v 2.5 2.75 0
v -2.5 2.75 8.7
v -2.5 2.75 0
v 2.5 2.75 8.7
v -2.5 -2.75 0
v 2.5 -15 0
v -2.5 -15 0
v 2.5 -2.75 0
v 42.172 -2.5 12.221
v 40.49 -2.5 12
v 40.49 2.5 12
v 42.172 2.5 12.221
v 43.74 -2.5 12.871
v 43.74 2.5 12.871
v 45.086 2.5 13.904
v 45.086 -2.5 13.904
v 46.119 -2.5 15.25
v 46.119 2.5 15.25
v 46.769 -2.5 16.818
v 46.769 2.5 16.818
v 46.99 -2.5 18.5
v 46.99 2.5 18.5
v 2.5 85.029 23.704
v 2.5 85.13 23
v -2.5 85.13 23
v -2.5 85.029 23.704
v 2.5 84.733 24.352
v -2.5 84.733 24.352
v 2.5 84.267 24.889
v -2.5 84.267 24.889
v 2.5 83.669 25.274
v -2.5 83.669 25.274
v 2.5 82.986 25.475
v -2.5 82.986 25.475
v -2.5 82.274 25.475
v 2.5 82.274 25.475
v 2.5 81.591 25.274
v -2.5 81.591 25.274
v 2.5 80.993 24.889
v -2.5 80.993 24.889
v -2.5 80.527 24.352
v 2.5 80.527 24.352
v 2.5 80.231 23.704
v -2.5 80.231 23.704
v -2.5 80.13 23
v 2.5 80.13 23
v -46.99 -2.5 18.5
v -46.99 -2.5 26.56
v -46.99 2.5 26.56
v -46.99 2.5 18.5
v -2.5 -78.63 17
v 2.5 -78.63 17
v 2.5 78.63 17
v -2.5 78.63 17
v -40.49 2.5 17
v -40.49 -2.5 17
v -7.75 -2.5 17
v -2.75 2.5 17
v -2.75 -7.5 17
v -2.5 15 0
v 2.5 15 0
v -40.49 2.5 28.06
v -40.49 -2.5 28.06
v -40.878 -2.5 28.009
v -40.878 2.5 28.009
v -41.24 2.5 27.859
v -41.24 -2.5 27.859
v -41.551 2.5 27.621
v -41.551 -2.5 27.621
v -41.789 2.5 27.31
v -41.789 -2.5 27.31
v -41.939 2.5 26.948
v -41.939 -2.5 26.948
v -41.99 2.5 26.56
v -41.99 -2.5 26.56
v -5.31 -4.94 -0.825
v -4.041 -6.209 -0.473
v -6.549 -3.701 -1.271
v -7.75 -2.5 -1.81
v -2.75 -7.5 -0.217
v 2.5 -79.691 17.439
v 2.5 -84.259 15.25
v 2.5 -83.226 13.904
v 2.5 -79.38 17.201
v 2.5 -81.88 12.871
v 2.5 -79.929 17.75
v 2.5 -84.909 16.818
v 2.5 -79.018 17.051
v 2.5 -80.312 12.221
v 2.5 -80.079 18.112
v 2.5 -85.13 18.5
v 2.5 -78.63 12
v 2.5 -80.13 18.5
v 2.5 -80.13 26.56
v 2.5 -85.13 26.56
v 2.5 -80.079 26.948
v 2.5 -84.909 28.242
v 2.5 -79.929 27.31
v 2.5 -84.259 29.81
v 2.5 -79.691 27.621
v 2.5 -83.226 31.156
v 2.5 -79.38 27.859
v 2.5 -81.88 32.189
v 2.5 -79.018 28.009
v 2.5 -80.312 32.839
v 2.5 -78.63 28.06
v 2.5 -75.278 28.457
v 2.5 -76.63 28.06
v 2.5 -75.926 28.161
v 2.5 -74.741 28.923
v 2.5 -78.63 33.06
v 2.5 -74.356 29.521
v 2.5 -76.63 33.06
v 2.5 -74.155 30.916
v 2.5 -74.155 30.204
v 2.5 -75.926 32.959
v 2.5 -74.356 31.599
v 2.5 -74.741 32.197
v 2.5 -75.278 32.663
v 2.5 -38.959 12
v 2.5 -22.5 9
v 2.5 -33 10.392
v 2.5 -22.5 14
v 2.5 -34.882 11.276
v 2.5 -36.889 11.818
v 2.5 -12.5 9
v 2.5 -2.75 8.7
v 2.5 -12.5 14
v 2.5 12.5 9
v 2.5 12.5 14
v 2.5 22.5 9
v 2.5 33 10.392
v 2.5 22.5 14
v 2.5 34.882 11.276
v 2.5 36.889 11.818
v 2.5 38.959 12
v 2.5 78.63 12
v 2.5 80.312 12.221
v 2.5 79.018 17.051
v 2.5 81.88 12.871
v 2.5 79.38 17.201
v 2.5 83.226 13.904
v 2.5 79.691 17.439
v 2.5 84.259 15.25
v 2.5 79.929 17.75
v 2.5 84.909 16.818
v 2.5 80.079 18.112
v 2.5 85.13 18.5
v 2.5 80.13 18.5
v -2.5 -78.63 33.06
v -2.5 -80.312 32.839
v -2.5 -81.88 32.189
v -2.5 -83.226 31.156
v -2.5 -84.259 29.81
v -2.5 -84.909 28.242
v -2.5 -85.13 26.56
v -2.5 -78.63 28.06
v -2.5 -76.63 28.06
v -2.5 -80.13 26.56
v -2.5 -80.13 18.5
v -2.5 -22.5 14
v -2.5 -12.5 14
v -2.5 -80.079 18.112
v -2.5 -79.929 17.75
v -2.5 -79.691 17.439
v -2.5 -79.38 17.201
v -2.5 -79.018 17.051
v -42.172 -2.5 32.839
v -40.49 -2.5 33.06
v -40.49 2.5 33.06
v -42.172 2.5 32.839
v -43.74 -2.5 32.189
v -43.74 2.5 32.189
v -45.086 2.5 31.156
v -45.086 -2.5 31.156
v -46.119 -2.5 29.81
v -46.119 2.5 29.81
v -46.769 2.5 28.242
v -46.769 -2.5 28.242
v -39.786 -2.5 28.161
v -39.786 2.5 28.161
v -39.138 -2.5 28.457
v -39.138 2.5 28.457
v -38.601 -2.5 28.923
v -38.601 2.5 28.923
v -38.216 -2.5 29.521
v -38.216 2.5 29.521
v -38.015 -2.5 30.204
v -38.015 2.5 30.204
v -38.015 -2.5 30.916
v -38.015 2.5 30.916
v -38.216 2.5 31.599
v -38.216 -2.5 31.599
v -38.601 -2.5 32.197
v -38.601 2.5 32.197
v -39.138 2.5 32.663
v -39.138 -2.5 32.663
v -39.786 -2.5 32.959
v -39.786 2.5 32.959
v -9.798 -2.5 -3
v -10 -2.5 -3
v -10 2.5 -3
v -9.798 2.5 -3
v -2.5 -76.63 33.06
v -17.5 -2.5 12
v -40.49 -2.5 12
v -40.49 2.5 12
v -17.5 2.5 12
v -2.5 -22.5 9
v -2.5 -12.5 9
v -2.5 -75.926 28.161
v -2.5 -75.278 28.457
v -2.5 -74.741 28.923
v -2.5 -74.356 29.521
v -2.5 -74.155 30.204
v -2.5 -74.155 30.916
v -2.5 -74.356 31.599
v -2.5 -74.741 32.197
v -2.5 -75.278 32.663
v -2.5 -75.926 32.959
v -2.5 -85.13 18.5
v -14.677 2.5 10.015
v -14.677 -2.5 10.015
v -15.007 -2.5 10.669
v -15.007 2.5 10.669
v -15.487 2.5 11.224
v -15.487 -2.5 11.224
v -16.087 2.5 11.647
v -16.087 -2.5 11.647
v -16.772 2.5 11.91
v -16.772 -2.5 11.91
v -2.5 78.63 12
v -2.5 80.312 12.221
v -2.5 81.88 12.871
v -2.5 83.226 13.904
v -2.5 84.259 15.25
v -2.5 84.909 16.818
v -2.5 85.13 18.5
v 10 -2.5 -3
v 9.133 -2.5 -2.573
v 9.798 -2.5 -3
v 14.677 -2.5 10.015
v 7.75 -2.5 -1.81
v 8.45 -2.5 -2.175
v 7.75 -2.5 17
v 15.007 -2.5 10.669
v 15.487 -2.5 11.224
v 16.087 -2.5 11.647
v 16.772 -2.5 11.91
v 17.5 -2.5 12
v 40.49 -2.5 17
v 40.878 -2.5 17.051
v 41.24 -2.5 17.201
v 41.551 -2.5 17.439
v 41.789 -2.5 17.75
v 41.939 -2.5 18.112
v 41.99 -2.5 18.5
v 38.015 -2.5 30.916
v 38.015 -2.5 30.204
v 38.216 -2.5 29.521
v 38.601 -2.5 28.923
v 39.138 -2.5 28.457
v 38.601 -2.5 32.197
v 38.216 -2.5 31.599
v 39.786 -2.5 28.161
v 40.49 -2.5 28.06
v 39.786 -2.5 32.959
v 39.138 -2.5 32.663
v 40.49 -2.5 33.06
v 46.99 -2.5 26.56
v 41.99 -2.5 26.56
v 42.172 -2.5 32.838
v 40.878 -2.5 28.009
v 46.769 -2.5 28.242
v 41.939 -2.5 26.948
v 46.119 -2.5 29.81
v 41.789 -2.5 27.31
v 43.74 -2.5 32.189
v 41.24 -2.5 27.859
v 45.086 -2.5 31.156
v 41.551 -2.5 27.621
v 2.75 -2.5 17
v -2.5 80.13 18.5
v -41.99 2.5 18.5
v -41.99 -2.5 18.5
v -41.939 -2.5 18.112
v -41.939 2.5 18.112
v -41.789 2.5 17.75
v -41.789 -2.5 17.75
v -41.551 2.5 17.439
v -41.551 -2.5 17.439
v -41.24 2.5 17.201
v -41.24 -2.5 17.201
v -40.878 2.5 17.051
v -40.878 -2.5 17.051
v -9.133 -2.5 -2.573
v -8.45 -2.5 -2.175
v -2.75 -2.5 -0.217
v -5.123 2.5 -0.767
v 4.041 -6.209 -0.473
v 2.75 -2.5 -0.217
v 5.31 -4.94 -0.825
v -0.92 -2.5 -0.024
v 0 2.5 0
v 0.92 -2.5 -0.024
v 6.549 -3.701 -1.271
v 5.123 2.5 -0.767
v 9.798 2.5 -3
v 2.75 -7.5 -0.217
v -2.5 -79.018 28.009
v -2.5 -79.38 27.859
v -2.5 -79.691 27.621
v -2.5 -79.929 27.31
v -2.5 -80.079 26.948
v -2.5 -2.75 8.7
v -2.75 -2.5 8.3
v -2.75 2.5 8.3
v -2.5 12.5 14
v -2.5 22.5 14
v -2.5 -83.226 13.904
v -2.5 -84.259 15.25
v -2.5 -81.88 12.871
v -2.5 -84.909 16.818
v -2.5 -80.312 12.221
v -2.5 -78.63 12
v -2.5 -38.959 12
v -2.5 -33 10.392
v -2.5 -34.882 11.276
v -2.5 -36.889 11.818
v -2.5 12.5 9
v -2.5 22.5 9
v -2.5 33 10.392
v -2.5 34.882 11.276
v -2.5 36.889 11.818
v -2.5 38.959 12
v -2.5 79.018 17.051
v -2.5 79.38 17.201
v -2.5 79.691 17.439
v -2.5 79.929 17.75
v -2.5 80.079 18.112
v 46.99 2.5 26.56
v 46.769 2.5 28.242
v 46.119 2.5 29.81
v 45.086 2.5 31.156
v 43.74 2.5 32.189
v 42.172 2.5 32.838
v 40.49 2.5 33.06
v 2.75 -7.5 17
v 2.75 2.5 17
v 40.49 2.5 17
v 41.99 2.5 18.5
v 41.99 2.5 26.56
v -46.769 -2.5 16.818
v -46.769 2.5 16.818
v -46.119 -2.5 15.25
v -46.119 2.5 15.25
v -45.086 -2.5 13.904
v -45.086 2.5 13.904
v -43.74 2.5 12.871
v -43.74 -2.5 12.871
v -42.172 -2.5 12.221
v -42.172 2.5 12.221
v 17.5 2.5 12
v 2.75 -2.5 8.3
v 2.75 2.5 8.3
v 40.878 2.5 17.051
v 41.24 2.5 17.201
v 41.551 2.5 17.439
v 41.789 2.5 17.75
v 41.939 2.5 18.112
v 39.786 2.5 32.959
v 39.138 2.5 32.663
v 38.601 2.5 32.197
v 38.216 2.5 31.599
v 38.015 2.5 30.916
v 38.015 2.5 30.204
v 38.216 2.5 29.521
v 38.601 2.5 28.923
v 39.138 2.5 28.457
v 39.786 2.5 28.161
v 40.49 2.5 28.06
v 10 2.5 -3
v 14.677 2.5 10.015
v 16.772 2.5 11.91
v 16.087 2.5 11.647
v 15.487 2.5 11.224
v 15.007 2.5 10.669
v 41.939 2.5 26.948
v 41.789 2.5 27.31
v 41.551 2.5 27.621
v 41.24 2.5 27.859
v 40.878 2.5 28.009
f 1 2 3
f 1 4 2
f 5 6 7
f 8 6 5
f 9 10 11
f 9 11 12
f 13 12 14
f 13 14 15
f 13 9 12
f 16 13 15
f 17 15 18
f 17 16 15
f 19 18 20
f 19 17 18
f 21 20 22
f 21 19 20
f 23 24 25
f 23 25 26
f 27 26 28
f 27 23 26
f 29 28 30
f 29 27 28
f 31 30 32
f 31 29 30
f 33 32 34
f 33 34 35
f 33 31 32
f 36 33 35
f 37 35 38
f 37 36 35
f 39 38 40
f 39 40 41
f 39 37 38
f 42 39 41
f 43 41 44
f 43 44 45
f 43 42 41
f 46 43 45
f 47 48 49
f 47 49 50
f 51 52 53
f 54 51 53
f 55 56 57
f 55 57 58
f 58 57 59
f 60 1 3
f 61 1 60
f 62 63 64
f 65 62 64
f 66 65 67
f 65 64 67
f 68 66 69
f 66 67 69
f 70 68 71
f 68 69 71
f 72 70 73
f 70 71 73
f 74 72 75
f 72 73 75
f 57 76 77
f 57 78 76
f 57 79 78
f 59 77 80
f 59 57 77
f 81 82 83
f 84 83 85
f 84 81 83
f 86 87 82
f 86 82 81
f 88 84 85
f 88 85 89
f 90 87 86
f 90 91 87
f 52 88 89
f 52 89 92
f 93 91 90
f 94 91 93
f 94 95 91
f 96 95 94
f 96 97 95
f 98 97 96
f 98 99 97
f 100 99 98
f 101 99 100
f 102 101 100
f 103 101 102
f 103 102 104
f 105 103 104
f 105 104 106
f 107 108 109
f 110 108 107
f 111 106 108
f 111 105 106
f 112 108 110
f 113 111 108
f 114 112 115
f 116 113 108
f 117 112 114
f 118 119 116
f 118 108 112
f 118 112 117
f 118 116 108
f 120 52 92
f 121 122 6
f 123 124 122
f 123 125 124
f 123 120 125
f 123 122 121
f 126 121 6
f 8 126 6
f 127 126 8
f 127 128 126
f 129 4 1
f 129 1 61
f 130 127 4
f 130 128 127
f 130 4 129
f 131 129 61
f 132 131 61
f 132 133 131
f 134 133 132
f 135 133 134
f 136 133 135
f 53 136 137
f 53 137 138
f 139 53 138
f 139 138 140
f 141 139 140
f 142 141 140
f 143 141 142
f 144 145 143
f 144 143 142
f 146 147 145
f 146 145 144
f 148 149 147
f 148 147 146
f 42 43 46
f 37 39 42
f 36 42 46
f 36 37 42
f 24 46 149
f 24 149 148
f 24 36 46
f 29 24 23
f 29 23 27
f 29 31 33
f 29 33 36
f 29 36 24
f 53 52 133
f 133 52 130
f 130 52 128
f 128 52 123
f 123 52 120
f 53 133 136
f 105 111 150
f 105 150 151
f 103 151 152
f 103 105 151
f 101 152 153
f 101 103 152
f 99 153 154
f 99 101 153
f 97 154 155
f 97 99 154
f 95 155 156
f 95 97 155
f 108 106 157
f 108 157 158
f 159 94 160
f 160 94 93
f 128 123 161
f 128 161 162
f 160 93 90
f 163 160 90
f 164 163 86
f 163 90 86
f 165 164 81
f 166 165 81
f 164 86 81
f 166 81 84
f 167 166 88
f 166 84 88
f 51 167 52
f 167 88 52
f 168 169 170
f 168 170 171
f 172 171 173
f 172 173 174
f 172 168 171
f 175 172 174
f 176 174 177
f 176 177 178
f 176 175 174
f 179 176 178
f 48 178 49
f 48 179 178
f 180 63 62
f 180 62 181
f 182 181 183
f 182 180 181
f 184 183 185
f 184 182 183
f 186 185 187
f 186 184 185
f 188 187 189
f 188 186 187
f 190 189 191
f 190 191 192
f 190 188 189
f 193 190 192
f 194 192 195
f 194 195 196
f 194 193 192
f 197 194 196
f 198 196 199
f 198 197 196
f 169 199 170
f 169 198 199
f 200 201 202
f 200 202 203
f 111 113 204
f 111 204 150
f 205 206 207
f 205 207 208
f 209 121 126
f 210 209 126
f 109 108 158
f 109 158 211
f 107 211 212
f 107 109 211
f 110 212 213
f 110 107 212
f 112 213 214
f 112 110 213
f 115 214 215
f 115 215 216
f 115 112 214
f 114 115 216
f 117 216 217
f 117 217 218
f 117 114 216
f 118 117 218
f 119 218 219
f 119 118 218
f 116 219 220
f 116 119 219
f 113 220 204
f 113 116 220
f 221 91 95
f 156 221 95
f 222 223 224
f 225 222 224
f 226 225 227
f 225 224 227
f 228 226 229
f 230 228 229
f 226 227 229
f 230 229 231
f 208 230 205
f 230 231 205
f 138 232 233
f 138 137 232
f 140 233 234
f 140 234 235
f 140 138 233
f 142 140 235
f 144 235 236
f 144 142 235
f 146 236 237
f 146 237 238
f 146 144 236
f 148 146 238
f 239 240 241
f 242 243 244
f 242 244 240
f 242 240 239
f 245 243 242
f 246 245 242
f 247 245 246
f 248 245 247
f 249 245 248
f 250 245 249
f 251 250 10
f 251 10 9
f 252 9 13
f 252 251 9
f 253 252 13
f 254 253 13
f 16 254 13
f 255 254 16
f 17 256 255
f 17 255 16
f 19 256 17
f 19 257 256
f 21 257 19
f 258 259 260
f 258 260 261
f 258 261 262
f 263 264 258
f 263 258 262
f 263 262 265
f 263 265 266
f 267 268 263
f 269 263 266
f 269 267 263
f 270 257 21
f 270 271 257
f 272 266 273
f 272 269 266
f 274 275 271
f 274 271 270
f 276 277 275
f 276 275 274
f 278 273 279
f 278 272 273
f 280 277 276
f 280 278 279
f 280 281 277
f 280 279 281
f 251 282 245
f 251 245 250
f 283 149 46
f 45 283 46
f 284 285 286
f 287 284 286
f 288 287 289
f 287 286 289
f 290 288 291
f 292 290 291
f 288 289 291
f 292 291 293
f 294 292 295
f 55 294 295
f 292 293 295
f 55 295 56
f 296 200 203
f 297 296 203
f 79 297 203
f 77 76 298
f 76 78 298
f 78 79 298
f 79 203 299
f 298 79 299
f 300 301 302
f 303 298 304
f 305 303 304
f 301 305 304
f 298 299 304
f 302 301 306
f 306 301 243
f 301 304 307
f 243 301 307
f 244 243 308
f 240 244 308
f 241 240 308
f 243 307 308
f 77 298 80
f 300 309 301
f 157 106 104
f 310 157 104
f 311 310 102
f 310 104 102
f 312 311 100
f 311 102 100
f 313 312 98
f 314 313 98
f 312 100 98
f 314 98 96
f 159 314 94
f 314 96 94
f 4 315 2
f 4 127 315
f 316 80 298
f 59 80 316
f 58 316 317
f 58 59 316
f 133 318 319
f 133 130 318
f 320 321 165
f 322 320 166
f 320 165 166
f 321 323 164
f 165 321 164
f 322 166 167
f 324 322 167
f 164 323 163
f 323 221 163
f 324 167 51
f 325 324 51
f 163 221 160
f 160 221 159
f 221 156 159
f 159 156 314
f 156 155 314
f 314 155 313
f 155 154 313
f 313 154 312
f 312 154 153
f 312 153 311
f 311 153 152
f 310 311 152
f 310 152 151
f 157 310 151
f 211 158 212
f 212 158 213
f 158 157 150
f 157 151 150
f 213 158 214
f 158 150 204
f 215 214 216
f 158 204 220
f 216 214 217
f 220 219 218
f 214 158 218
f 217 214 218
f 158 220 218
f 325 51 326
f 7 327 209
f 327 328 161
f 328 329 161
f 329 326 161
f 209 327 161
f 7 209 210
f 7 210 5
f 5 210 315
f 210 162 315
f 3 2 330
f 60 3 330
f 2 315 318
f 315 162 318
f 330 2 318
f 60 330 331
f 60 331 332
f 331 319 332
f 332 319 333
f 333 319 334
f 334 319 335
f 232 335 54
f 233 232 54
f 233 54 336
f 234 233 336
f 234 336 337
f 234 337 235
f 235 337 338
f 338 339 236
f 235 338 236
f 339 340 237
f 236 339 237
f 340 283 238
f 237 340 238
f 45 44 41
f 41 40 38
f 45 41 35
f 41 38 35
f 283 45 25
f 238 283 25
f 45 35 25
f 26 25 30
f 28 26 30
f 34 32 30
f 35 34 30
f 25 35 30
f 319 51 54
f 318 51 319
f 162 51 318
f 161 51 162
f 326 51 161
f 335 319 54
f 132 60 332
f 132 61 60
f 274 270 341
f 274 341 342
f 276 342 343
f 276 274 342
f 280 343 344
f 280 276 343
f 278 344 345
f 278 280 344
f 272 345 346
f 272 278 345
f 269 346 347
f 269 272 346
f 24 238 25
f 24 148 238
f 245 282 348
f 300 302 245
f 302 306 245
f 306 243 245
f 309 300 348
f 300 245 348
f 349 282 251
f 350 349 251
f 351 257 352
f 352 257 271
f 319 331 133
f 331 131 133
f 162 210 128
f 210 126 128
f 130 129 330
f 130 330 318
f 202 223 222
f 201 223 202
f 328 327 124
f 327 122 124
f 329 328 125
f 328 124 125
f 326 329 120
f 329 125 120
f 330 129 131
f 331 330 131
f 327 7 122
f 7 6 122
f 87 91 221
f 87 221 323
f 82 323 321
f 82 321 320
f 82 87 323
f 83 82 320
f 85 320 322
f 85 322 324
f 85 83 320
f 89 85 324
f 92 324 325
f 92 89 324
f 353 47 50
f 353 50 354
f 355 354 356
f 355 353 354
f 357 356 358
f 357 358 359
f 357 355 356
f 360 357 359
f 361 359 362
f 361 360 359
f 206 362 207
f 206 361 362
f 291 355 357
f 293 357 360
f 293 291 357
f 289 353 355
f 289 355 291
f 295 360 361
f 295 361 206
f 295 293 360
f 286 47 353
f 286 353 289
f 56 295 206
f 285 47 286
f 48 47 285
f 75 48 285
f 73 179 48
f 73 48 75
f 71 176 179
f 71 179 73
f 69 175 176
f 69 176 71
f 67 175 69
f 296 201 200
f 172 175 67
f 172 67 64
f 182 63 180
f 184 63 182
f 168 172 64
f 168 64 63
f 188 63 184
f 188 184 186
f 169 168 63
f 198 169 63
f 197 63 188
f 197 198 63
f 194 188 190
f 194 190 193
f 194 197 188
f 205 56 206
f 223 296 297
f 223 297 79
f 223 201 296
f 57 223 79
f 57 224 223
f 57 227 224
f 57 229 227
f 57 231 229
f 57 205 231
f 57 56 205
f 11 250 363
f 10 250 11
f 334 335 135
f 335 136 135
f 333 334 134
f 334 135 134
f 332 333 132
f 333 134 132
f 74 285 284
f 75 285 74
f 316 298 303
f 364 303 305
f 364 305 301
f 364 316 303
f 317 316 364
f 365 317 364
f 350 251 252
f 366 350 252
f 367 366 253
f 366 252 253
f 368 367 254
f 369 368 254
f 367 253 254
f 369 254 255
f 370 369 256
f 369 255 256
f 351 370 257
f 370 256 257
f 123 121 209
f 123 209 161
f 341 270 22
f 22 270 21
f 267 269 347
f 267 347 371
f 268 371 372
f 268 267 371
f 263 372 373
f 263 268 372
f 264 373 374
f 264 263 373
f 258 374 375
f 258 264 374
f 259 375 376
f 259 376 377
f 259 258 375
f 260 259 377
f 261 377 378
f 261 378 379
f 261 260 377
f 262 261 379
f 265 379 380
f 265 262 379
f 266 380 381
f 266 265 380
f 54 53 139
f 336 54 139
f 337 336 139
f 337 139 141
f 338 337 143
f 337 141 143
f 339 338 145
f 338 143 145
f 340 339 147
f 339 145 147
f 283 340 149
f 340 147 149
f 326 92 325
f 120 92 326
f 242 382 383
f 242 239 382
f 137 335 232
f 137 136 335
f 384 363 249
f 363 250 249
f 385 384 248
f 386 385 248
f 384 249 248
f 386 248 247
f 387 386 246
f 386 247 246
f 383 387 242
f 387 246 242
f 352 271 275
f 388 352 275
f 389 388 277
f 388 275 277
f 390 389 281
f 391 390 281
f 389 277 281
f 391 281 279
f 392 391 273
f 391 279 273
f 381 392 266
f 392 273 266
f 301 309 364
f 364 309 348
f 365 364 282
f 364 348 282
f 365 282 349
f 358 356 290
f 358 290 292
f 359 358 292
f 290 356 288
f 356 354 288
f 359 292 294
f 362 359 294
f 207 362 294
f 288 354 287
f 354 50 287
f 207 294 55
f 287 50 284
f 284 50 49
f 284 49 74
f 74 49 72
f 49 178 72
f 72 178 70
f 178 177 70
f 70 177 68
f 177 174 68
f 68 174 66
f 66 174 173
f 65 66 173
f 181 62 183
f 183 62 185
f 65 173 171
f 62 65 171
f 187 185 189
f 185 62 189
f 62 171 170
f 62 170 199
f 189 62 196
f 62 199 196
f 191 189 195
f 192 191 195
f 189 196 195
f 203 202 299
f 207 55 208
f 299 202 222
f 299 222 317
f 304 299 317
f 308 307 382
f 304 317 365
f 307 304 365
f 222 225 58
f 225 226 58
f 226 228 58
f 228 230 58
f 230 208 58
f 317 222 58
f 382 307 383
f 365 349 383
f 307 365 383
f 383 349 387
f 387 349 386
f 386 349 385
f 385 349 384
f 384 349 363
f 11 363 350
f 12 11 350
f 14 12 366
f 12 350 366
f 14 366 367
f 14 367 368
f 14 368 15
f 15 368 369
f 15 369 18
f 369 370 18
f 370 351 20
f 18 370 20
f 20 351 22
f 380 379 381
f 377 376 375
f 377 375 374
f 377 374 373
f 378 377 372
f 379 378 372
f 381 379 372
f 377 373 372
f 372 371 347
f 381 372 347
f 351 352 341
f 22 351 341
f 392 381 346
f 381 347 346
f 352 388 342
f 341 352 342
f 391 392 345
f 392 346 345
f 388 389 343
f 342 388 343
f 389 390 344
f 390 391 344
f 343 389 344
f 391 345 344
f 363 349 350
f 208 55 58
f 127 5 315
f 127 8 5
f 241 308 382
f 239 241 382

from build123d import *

# Parameters (mm, degrees)
SKETCH_W     = 10
SKETCH_H     = 5
PAD_DEPTH    = 2.5
PAD001_DEPTH = 2.5
PAD002_DEPTH = 20
POCKET_DEPTH = 10


with BuildPart() as vertical:
    # Sketch → Pad (new body, symmetric)
    with BuildSketch(Plane.YZ):
        with BuildLine():
            Line((85.13, 18.499999), (85.13, 23.000005))
            ThreePointArc((85.13, 23.000005), (82.629997, 25.500005), (80.13, 23))
            Line((80.13, 18.500007), (80.13, 23))
            ThreePointArc((78.630003, 17), (79.690664, 17.439343), (80.13, 18.500007))
            Line((-78.630002, 17), (78.630003, 17))
            ThreePointArc((-80.13, 18.500007), (-79.690663, 17.439343), (-78.630002, 17))
            Line((-80.13, 26.559992), (-80.13, 18.500007))
            ThreePointArc((-78.630002, 28.06), (-79.690664, 27.620657), (-80.13, 26.559992))
            Line((-78.630002, 28.06), (-76.630002, 28.06))
            ThreePointArc((-76.630002, 28.06), (-74.130001, 30.56), (-76.630001, 33.06))
            Line((-76.630001, 33.06), (-78.63, 33.06))
            ThreePointArc((-78.63, 33.06), (-83.226194, 31.156194), (-85.13, 26.56))
            Line((-85.13, 18.500007), (-85.13, 26.56))
            ThreePointArc((-85.13, 18.500007), (-83.226197, 13.903808), (-78.63, 12))
            Line((-78.63, 12), (-38.959283, 12))
            ThreePointArc((-33, 10.392302), (-35.873115, 11.591017), (-38.959283, 12))
            Line((-15, 0), (-33, 10.392302))
            Line((-15, 0), (-2.75, 0))
            Line((-2.75, 0), (-2.75, 8.7))
            Line((-2.75, 8.7), (2.75, 8.7))
            Line((2.75, 8.7), (2.75, 0))
            Line((2.75, 0), (15, 0))
            Line((15, 0), (33, 10.392302))
            ThreePointArc((38.959283, 12), (35.873115, 11.591017), (33, 10.392302))
            Line((38.959283, 12), (78.63, 12))
            ThreePointArc((78.63, 12), (83.226194, 13.903806), (85.13, 18.499999))
        make_face()
        with Locations((-17.5, 11.5)):
            Rectangle(SKETCH_W, SKETCH_H, mode=Mode.SUBTRACT)
        with Locations((17.5, 11.5)):
            Rectangle(SKETCH_W, SKETCH_H, mode=Mode.SUBTRACT)
    extrude(amount=PAD_DEPTH, both=True)


with BuildPart() as fusion:
    # Sketch001 → Pad001 (new body, symmetric)
    with BuildSketch(Plane.XZ):
        with BuildLine():
            Line((17.5, 11.999987), (40.490006, 12))
            ThreePointArc((40.490006, 12), (45.086195, 13.903807), (46.99, 18.499998))
            Line((46.99, 26.559977), (46.99, 18.499998))
            ThreePointArc((46.99, 26.559977), (45.086194, 31.156169), (40.490002, 33.059975))
            ThreePointArc((40.490002, 33.059975), (37.990002, 30.559975), (40.490002, 28.059975))
            ThreePointArc((41.99, 26.559977), (41.55066, 27.620635), (40.490002, 28.059975))
            Line((41.99, 18.499998), (41.99, 26.559977))
            ThreePointArc((40.490002, 17), (41.55066, 17.43934), (41.99, 18.499998))
            Line((2.75, 17), (40.490002, 17))
            Line((2.75, 8.3), (2.75, 17))
            Line((-2.75, 8.3), (2.75, 8.3))
            Line((-2.75, 16.999987), (-2.75, 8.3))
            Line((-40.49, 16.999987), (-2.75, 16.999987))
            ThreePointArc((-41.99, 18.499998), (-41.550664, 17.43933), (-40.49, 16.999987))
            Line((-41.99, 18.499998), (-41.99, 26.559977))
            ThreePointArc((-40.490001, 28.059987), (-41.550664, 27.620643), (-41.99, 26.559977))
            ThreePointArc((-40.490001, 28.059987), (-37.990001, 30.559987), (-40.490001, 33.059987))
            ThreePointArc((-40.490001, 33.059987), (-45.086198, 31.156177), (-46.99, 26.559976))
            Line((-46.99, 26.559976), (-46.99, 18.499999))
            ThreePointArc((-46.99, 18.499999), (-45.086199, 13.903798), (-40.490002, 11.999987))
            Line((-40.490002, 11.999987), (-17.5, 11.999987))
            ThreePointArc((-14.676752, 10.014518), (-15.774253, 11.453922), (-17.5, 11.999987))
            Line((-14.676752, 10.014518), (-10, -3))
            Line((-10, -3), (10, -3))
            Line((10, -3), (14.676754, 10.014518))
            ThreePointArc((17.5, 11.999987), (15.774254, 11.453921), (14.676754, 10.014518))
        make_face()
    extrude(amount=PAD001_DEPTH, both=True)

    # Sketch002 → Pad002 (new body)
    with BuildSketch(Plane(origin=(0, 0, 16.999987), x_dir=(-1, 0, 0), z_dir=(0, 0, 1))):
        Polygon((-7.75, 2.5), (-2.75, 7.5), (-2.75, 2.5), align=None)
        Polygon((2.75, 7.5), (2.75, 2.5), (7.75, 2.5), align=None)
    extrude(amount=-PAD002_DEPTH)

    # Sketch003 → Pocket (cut)
    with BuildSketch(Plane(origin=(0, 2.5, 0), x_dir=(1, 0, 0), z_dir=(0, 1, 0))):
        with BuildLine():
            ThreePointArc((-10, 3.138593), (0, 0), (10, 3.138593))
            Line((-10, 3.138593), (10, 3.138593))
        make_face()
    extrude(amount=-POCKET_DEPTH, mode=Mode.SUBTRACT)

    # Fusion: union Vertical
    add(vertical.part)


solid = fusion.part
